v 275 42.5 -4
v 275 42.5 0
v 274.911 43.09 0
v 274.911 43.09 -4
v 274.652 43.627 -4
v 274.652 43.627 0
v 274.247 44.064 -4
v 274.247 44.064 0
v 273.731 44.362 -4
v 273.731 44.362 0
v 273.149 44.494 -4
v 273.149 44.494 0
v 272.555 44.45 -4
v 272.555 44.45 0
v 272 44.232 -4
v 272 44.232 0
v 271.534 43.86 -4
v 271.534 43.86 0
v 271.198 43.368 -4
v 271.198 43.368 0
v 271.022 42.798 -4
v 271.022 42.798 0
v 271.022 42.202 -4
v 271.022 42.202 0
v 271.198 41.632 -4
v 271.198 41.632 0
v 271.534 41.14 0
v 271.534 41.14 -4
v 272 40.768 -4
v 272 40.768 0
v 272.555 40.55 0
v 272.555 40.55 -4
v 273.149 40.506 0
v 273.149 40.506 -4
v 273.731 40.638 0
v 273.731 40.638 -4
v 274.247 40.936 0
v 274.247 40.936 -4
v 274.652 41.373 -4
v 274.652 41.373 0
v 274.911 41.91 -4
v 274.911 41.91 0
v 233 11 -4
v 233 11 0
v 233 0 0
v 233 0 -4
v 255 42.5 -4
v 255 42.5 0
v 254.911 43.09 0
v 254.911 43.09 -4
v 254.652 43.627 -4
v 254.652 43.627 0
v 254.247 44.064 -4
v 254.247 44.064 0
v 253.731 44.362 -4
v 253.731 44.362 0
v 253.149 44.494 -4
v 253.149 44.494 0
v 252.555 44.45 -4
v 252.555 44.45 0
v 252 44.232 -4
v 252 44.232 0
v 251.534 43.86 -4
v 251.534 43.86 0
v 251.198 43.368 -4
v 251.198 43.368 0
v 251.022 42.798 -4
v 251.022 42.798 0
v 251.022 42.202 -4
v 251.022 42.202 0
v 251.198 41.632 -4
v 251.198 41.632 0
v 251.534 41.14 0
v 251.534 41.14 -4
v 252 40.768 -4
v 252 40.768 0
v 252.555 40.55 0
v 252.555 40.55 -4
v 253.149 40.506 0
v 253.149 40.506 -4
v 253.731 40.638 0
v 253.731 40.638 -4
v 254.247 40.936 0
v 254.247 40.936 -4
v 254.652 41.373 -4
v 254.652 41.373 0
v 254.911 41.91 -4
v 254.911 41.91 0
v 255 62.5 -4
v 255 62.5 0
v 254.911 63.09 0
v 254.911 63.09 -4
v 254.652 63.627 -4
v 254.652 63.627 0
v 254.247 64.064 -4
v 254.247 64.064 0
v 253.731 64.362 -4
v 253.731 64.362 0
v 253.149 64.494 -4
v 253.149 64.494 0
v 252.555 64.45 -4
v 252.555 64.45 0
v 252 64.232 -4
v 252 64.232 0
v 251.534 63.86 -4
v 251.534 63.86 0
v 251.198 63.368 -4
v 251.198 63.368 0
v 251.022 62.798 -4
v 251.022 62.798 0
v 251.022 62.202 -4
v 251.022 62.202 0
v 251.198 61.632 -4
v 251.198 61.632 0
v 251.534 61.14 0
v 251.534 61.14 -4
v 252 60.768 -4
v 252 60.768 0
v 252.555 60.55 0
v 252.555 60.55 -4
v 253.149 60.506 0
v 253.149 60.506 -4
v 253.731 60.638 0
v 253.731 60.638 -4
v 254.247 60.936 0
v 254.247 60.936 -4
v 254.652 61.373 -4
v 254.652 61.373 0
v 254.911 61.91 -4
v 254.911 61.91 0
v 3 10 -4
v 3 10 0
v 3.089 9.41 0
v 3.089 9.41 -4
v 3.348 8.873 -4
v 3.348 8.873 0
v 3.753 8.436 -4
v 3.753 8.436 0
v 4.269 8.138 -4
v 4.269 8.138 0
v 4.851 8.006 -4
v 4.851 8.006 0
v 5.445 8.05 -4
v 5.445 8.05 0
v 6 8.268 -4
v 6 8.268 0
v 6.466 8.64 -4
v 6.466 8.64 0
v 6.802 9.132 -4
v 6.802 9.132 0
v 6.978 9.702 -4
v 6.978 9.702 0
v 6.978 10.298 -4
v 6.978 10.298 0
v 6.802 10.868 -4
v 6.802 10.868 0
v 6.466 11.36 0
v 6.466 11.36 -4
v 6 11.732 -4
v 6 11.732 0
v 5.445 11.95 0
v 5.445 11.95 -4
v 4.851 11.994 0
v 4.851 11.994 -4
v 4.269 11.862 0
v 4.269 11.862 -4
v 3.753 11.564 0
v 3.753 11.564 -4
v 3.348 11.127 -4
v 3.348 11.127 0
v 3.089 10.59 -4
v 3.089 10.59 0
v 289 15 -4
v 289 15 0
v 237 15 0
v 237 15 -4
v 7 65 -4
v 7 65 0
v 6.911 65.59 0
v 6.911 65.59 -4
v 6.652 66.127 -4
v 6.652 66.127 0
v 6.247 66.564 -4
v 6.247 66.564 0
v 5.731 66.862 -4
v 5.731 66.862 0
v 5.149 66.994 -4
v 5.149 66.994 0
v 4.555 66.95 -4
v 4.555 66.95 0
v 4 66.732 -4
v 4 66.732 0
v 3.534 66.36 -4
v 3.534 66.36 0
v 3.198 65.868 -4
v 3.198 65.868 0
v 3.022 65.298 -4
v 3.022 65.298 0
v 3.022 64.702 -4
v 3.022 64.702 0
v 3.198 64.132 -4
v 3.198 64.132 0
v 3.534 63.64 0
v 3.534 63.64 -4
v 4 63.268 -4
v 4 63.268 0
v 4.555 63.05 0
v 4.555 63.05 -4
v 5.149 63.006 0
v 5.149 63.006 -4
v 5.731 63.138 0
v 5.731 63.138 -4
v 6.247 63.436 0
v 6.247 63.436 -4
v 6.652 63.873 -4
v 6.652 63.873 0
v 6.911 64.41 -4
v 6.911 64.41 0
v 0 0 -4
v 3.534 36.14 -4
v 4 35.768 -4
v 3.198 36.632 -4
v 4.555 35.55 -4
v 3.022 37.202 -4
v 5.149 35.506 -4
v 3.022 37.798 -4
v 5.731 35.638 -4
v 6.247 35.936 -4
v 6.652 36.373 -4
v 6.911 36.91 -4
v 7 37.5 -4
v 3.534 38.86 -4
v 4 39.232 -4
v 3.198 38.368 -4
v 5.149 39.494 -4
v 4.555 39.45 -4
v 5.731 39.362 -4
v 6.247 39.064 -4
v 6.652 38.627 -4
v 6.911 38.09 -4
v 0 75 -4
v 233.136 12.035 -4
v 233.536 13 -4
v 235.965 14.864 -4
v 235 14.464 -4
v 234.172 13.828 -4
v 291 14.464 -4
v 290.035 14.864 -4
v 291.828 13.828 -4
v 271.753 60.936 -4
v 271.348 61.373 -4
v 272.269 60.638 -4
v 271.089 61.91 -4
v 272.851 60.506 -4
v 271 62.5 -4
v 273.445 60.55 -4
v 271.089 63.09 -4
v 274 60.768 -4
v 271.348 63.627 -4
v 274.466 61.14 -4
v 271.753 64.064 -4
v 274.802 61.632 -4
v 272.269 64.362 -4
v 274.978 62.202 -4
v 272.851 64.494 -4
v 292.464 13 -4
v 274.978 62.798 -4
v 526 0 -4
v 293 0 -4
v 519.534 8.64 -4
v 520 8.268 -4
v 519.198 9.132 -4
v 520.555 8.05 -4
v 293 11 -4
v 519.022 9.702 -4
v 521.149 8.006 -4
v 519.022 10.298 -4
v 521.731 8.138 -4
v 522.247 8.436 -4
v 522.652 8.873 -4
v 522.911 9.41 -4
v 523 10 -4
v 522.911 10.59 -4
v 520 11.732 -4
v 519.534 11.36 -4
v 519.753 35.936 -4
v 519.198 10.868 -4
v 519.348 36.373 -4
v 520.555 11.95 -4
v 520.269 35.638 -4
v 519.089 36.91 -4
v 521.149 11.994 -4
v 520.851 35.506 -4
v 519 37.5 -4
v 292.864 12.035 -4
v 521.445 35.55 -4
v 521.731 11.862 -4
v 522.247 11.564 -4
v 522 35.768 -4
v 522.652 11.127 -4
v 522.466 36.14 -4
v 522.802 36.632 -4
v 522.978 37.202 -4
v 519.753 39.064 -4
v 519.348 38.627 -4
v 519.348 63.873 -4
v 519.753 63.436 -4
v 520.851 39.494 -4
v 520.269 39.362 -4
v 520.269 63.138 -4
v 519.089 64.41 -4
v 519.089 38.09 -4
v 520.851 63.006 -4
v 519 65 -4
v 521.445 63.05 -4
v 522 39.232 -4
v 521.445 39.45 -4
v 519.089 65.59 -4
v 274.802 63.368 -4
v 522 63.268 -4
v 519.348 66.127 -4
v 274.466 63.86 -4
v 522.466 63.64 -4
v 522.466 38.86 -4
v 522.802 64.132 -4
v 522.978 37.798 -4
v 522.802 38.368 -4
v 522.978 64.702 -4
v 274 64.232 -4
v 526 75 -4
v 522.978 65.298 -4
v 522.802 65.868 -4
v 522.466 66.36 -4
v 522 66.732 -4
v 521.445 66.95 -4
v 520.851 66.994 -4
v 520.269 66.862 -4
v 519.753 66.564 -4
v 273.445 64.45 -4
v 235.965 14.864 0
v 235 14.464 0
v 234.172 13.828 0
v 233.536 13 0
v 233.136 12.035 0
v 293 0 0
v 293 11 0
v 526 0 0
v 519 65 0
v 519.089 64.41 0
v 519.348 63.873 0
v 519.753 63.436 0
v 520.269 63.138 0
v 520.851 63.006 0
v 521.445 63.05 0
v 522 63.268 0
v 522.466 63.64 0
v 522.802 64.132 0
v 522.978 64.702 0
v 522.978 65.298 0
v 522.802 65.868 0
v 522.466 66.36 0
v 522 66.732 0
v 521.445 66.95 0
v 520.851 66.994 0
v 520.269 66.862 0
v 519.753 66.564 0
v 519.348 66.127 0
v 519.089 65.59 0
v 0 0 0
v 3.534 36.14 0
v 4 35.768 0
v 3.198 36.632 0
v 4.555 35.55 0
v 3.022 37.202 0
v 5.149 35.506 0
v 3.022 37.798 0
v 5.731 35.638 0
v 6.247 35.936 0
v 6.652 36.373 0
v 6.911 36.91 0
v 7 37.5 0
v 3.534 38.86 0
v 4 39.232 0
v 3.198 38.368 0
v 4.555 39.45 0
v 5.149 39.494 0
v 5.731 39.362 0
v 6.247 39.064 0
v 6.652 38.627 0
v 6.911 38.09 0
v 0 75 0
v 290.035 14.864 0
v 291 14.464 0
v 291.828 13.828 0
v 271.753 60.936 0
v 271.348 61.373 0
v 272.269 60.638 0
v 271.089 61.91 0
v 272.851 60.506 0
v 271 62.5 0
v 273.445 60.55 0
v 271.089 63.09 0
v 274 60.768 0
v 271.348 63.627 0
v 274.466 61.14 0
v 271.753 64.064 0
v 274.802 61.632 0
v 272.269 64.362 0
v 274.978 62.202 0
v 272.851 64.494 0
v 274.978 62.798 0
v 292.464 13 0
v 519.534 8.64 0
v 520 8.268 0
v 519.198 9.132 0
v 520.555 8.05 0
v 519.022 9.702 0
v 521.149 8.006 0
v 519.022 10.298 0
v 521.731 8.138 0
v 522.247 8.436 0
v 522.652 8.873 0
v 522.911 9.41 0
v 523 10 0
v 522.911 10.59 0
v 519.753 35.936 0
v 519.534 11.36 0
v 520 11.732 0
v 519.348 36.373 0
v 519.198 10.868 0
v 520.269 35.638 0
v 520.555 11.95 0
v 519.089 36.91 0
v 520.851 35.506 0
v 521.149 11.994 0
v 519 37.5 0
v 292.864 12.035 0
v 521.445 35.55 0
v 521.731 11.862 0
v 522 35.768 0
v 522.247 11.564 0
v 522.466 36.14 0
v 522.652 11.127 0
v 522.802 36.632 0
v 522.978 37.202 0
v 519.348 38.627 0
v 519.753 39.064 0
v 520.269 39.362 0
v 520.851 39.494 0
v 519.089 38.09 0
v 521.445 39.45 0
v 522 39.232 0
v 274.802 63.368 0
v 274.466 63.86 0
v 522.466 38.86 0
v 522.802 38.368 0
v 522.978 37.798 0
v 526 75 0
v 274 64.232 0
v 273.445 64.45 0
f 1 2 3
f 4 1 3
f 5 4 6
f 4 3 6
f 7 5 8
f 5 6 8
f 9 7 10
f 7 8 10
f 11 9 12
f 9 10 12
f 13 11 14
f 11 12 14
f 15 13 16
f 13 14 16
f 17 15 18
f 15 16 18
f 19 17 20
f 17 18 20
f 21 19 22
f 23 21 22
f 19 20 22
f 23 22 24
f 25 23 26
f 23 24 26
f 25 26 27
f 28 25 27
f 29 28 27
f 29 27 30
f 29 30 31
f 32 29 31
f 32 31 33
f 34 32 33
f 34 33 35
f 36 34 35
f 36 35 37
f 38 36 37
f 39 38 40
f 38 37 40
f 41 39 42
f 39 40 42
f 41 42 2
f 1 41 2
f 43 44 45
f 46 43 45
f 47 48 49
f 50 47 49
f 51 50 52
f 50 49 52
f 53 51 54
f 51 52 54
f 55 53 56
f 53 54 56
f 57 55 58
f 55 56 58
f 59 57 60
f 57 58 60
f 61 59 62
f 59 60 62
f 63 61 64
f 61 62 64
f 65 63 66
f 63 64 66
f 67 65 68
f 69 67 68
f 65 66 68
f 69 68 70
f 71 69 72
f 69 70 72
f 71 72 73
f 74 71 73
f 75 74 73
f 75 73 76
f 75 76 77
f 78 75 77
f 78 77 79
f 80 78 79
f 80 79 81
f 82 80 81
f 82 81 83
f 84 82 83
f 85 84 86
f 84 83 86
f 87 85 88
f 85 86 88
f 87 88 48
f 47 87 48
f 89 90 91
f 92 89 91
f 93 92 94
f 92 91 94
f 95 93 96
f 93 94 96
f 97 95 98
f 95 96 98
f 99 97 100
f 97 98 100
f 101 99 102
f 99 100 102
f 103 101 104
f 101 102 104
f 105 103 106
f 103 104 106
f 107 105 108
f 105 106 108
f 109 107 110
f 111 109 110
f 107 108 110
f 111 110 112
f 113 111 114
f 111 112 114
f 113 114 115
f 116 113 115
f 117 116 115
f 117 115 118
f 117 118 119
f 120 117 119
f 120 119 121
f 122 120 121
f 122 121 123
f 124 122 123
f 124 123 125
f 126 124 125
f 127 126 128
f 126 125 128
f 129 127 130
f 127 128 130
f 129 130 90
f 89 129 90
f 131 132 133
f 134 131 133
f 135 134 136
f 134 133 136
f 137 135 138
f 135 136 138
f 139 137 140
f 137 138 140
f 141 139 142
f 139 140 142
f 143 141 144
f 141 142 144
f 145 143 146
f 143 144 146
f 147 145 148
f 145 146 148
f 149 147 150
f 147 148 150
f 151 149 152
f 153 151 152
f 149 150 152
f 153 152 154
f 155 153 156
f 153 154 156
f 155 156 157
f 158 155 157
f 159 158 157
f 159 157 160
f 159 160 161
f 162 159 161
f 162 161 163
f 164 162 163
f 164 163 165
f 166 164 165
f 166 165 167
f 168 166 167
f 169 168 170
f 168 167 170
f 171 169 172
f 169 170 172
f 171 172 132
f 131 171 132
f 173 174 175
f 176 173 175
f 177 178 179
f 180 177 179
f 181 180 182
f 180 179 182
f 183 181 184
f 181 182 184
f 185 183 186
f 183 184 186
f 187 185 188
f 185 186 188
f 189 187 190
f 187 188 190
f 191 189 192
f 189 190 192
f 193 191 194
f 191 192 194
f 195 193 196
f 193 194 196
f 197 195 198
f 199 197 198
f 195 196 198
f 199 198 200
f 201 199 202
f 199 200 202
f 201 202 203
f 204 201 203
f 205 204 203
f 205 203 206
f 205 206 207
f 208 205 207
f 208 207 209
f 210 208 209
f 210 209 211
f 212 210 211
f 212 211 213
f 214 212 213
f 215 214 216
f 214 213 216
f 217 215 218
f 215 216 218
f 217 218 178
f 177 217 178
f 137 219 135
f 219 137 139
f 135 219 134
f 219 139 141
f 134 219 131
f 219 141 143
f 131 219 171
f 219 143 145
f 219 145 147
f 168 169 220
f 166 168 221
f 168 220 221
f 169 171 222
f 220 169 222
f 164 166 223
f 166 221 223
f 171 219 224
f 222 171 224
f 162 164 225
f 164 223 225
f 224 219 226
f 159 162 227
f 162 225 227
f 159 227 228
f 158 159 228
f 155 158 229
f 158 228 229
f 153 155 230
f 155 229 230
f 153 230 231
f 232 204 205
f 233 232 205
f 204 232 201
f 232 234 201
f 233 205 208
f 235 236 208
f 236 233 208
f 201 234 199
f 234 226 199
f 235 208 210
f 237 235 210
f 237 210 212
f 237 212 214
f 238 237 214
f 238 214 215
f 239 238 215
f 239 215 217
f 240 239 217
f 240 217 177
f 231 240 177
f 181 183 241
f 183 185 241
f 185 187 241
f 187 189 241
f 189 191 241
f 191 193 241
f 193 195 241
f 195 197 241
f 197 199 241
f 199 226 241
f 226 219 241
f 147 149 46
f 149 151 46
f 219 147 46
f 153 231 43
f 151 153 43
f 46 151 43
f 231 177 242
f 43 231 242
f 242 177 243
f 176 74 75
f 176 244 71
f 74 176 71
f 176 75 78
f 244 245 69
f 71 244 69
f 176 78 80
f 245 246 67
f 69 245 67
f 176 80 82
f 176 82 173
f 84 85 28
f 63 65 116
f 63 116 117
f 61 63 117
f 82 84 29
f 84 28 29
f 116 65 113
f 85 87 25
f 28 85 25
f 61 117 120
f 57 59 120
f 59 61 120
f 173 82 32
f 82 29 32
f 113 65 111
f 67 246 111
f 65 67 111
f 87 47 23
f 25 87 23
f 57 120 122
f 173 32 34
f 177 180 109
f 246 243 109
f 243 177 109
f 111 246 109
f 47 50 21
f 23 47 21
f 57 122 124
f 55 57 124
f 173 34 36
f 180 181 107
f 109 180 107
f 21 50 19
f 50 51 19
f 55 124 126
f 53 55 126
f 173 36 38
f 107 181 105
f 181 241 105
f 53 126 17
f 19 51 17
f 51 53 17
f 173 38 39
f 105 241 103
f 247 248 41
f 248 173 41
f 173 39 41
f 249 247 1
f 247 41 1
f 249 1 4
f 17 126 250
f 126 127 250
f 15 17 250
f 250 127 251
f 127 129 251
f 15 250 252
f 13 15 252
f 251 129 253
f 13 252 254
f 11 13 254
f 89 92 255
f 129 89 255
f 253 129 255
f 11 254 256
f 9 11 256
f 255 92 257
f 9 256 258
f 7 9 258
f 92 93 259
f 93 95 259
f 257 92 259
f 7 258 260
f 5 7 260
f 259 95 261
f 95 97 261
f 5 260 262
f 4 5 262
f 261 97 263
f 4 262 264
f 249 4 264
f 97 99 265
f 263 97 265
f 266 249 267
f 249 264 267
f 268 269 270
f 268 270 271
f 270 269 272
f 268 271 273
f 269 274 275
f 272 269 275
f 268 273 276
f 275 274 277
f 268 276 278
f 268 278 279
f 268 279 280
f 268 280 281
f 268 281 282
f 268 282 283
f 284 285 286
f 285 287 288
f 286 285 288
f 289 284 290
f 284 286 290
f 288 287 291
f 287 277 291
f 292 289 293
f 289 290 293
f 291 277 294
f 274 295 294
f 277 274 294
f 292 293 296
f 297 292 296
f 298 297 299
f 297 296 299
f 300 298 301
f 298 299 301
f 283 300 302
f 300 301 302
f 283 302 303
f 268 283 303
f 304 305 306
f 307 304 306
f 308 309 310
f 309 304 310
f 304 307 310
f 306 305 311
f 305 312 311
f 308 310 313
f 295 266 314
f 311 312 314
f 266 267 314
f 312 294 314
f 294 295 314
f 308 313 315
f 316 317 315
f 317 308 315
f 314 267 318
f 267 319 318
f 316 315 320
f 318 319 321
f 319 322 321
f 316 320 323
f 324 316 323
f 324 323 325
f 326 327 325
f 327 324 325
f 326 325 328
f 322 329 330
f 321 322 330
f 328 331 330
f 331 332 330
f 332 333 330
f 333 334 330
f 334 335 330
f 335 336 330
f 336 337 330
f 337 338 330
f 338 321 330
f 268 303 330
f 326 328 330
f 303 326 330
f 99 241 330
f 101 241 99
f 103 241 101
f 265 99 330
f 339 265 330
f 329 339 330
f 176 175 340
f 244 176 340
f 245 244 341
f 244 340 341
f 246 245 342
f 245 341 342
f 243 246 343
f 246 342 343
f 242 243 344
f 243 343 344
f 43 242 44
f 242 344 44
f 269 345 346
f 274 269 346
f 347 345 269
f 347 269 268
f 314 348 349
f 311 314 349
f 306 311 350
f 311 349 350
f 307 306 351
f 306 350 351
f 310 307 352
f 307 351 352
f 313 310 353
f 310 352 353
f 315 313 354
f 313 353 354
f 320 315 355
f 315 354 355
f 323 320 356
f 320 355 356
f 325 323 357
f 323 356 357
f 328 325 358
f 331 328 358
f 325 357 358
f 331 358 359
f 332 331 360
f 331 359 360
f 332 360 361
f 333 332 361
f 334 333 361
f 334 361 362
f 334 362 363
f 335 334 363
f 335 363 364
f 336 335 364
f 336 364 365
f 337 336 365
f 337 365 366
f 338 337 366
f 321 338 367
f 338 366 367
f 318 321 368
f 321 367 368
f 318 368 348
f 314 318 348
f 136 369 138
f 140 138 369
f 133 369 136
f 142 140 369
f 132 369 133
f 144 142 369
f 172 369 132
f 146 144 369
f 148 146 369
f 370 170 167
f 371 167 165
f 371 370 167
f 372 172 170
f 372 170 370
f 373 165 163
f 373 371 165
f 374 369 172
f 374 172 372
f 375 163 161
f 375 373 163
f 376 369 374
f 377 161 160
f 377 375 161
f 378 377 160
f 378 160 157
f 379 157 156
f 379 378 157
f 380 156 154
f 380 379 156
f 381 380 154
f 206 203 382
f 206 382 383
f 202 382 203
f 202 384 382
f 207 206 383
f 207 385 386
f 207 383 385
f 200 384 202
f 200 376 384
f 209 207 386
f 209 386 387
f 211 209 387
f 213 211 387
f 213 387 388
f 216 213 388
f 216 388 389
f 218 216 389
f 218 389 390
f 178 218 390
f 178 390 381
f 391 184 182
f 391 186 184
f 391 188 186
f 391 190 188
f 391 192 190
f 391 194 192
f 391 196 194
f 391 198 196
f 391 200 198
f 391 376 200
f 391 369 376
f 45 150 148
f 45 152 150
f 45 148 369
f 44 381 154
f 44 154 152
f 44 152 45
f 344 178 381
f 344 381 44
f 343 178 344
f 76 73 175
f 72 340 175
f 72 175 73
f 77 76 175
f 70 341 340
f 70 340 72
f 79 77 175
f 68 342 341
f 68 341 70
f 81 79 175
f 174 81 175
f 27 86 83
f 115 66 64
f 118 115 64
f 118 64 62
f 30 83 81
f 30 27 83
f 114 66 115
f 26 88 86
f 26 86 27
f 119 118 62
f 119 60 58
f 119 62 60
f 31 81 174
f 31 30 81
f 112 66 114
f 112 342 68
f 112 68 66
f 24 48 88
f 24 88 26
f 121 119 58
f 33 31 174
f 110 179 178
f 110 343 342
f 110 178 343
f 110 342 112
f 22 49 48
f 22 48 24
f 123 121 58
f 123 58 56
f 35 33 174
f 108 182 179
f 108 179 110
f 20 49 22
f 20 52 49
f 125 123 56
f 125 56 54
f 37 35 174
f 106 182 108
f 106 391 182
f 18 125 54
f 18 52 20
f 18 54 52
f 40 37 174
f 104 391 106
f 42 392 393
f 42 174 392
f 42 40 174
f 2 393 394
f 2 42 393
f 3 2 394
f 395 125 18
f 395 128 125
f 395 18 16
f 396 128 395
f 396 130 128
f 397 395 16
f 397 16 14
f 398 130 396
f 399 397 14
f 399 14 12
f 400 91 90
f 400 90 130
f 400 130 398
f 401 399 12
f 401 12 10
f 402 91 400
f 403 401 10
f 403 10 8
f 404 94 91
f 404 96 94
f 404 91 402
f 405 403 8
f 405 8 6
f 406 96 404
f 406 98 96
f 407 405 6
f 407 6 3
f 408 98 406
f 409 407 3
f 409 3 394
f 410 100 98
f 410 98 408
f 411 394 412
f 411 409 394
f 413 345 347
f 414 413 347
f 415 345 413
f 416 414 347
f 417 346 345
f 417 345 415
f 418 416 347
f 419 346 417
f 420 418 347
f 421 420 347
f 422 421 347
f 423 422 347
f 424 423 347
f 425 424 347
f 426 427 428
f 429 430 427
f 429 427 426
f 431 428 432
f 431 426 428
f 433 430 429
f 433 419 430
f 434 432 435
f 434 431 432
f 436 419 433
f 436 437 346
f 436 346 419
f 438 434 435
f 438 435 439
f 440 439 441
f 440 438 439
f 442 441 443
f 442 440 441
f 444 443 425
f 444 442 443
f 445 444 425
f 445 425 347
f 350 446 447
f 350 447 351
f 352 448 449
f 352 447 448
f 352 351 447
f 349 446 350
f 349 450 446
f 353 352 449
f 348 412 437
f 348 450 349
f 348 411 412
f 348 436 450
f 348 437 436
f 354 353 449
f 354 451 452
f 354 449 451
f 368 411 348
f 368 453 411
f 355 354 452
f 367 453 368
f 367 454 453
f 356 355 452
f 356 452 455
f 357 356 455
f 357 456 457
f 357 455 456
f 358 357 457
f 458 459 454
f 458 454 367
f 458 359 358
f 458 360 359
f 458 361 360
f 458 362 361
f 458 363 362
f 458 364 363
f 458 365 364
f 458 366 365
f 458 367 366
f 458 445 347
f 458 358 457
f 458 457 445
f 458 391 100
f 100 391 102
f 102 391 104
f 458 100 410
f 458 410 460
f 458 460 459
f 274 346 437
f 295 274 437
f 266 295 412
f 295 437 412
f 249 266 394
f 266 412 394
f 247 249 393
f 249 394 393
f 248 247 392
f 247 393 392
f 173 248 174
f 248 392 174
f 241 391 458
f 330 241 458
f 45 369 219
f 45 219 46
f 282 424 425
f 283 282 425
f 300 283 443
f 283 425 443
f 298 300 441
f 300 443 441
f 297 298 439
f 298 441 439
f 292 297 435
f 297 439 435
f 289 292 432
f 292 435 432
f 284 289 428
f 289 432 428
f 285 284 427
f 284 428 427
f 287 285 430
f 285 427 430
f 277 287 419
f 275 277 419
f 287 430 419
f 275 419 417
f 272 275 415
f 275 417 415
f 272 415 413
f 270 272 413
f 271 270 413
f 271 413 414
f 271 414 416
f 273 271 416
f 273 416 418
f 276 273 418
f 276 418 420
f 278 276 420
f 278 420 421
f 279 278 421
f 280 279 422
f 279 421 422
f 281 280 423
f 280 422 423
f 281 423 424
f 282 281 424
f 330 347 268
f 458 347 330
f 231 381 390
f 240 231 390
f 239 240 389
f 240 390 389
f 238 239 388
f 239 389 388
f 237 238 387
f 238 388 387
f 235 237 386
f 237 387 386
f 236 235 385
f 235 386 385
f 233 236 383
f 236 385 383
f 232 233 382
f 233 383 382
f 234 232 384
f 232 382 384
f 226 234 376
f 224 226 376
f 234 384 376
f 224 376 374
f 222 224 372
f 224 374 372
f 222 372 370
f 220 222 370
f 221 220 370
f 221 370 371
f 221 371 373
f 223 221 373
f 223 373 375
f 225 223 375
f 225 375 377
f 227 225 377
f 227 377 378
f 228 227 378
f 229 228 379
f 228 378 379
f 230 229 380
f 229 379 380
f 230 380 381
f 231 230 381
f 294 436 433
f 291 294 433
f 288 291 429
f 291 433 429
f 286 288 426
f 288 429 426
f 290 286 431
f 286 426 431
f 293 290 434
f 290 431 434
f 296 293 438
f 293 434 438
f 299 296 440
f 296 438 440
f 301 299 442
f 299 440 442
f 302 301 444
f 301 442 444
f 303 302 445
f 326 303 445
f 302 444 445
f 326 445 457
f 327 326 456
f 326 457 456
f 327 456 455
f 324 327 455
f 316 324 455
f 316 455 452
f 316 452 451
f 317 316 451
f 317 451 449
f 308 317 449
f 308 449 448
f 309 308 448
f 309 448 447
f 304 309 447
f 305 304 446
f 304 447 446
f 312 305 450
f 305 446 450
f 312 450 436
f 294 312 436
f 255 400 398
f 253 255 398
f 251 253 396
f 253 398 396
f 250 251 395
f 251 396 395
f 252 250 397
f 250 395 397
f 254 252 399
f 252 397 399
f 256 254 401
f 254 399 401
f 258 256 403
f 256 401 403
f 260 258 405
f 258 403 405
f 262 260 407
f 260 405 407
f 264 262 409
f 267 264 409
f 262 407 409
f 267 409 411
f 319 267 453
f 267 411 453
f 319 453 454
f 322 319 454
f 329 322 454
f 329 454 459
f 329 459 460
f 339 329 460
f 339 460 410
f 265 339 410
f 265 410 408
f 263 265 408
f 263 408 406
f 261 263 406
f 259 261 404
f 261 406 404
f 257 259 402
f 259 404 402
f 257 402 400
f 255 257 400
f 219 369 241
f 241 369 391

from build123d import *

# Parameters (mm, degrees)
SCHIZZO1_W                   = 526
SCHIZZO1_H                   = 75
SCHIZZO1_R                   = 2
ESTRUSIONE_ESTRUSIONE1_DEPTH = 4
SCHIZZO2_R                   = 2
TAGLIO_ESTRUSIONE1_DEPTH     = 4


with BuildPart() as part:
    # Schizzo1 → Estrusione-Estrusione1 (new body)
    with BuildSketch(Plane.XY):
        with Locations((263, 37.5)):
            Rectangle(SCHIZZO1_W, SCHIZZO1_H)
        with Locations((5, 37.5)):
            Circle(SCHIZZO1_R, mode=Mode.SUBTRACT)
        with Locations((5, 65)):
            Circle(SCHIZZO1_R, mode=Mode.SUBTRACT)
        with Locations(Location((5, 10, 0), (0, 0, 180))):
            Circle(SCHIZZO1_R, mode=Mode.SUBTRACT)
        with Locations((521, 10)):
            Circle(SCHIZZO1_R, mode=Mode.SUBTRACT)
        with Locations(Location((521, 65, 0), (0, 0, 180))):
            Circle(SCHIZZO1_R, mode=Mode.SUBTRACT)
        with Locations(Location((521, 37.5, 0), (0, 0, 180))):
            Circle(SCHIZZO1_R, mode=Mode.SUBTRACT)
    extrude(amount=-ESTRUSIONE_ESTRUSIONE1_DEPTH)

    # Schizzo2 → Taglio-Estrusione1 (cut)
    with BuildSketch(Plane.XY):
        with Locations((253, 62.5)):
            Circle(SCHIZZO2_R)
        with Locations(Location((273, 62.5, 0), (0, 0, 180))):
            Circle(SCHIZZO2_R)
        with Locations((253, 42.5)):
            Circle(SCHIZZO2_R)
        with Locations((273, 42.5)):
            Circle(SCHIZZO2_R)
        with BuildLine():
            Line((293, -15), (293, 11))
            ThreePointArc((293, 11), (291.828427125, 13.828427125), (289, 15))
            Line((289, 15), (237, 15))
            ThreePointArc((237, 15), (234.171572875, 13.828427125), (233, 11))
            Line((233, 11), (233, -15))
            Line((233, -15), (293, -15))
        make_face()
    extrude(amount=-TAGLIO_ESTRUSIONE1_DEPTH, mode=Mode.SUBTRACT)


solid = part.part
